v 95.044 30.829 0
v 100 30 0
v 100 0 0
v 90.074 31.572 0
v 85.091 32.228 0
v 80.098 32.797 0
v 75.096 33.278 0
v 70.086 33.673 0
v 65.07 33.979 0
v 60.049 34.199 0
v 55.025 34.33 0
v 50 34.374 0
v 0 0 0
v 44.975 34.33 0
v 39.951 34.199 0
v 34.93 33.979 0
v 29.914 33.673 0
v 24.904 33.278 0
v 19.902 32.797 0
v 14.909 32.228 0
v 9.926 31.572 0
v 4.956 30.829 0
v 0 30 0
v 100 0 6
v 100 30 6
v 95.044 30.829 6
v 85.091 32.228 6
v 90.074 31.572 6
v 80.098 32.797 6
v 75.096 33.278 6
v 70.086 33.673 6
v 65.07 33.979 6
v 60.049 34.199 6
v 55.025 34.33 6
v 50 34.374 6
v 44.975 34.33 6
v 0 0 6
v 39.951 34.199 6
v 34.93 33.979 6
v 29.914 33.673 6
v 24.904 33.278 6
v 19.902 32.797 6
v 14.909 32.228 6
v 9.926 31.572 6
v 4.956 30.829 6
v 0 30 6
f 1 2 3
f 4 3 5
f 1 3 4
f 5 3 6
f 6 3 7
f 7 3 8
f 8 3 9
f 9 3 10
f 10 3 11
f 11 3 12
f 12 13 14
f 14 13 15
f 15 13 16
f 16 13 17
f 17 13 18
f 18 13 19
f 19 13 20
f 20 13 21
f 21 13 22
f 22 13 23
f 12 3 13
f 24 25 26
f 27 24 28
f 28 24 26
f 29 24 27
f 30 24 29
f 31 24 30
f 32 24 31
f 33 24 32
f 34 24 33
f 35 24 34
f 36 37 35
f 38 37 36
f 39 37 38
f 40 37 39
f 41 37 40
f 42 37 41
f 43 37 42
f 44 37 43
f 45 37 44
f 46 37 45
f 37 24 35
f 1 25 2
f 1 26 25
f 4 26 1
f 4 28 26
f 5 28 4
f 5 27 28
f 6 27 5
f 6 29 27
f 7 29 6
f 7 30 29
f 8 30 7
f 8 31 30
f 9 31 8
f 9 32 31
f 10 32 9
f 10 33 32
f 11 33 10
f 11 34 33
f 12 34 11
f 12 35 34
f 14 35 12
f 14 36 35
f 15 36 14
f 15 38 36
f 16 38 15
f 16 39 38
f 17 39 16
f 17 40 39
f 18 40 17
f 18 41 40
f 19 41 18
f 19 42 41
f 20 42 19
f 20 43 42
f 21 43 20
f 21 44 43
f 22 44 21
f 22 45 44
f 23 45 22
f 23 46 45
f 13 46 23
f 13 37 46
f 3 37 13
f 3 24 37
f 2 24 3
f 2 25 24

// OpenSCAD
$fn = 32;

// ----------------------------------------------------------------------
// Arc profile plate: crown, 23 points
// ----------------------------------------------------------------------

// --- parameters (mm) ---
bar_l = 100;              // bar length, X
bar_w = 30;               // bar height at the ends, Y
arc_r = 287.94;           // radius of the crown arc
arc_angle = 20;           // crown arc angle, degrees
crown_rise = 4.37;        // rise of the crown over the ends
arc_step = 1;             // sampling step of the crown arc, degrees
plate_t = 6;              // plate thickness, Z

bbox_y = bar_w + crown_rise;  // full height with the crown

profile = [[100, 30], [95.044, 30.829], [90.074, 31.572], [85.091, 32.228], [80.098, 32.797], [75.096, 33.278], [70.086, 33.673], [65.07, 33.979], [60.049, 34.199], [55.025, 34.33], [50, 34.374], [44.975, 34.33], [39.951, 34.199], [34.93, 33.979], [29.914, 33.673], [24.904, 33.278], [19.902, 32.797], [14.909, 32.228], [9.926, 31.572], [4.956, 30.829], [0, 30], [0, 0], [100, 0]];  // primary outline, 23 points, counter clockwise

// --- the one profile operation ---
linear_extrude(height = plate_t) polygon(points = profile);
